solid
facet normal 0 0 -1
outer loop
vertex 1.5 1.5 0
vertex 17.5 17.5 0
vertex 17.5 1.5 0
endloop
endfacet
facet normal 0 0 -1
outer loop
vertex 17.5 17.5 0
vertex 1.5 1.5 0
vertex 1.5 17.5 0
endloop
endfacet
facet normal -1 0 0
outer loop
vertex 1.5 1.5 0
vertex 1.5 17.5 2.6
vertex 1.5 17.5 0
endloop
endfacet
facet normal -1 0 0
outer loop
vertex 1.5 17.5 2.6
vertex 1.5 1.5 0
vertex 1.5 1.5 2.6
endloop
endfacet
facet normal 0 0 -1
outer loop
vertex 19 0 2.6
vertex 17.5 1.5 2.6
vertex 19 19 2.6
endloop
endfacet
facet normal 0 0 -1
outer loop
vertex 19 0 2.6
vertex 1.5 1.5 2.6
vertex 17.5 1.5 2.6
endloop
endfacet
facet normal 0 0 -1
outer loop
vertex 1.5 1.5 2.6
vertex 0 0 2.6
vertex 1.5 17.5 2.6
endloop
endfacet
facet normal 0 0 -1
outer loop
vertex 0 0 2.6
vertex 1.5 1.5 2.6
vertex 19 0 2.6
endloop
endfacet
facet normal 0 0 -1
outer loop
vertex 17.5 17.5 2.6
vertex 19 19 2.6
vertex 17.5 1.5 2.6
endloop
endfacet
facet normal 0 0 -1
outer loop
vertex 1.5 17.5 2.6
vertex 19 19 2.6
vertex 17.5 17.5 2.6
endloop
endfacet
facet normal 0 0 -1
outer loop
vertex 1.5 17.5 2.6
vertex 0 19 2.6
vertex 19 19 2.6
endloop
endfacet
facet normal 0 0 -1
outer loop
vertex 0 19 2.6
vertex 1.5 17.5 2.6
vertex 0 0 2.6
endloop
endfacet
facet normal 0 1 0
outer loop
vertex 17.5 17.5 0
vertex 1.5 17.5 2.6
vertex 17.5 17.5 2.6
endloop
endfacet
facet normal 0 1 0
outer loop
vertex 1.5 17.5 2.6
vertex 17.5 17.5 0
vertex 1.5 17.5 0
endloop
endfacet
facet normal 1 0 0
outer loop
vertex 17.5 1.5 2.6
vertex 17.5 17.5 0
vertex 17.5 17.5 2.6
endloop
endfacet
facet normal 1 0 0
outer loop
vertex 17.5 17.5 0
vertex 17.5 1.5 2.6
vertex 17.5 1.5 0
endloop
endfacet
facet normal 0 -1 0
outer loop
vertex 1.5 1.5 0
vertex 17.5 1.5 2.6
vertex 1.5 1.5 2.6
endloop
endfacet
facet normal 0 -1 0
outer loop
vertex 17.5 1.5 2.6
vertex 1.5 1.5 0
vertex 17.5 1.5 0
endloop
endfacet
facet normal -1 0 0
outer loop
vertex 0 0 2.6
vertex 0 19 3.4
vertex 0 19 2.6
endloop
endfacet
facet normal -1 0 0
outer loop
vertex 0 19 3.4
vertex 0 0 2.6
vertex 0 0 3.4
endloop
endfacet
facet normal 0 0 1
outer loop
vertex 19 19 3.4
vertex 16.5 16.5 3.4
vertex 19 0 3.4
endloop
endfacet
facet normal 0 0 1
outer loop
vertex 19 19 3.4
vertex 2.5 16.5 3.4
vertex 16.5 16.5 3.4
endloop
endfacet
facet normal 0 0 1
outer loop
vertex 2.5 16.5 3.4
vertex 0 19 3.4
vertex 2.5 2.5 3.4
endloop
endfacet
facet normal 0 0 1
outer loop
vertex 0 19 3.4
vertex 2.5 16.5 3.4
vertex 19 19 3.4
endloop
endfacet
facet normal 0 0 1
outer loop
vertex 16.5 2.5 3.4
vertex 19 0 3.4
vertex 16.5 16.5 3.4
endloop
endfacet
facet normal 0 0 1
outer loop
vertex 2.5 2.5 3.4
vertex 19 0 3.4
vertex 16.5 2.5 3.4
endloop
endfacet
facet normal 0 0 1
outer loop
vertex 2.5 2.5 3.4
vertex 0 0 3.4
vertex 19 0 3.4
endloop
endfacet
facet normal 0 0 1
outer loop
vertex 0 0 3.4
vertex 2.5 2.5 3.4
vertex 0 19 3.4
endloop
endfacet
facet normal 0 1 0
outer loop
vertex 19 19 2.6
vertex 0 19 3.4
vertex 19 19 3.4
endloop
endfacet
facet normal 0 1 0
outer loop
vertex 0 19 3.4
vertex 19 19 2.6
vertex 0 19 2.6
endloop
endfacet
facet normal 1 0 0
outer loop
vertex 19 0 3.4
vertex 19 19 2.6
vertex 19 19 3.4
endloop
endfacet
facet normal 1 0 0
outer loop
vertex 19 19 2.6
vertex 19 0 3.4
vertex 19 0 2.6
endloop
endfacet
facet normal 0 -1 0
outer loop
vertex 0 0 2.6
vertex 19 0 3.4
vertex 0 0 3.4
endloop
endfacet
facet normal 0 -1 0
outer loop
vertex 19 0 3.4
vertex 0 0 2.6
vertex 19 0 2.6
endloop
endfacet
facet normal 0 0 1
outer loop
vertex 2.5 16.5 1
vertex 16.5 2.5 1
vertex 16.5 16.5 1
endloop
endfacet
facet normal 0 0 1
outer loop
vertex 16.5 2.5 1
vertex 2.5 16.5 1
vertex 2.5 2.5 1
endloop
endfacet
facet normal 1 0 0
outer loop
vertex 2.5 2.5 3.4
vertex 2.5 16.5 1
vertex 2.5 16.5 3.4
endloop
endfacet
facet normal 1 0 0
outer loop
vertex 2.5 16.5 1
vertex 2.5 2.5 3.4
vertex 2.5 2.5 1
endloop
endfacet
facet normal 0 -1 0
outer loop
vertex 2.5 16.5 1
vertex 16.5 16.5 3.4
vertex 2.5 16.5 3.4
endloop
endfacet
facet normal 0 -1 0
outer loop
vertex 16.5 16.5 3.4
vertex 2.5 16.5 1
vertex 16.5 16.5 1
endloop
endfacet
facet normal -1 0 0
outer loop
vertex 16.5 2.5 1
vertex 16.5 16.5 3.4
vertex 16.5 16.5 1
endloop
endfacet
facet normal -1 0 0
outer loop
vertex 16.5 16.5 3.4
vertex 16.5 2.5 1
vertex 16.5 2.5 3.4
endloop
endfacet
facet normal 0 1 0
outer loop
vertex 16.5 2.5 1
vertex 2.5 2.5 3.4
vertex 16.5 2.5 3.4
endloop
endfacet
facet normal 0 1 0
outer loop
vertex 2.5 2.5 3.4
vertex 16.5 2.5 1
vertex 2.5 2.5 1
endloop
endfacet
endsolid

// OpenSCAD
// Cleaver rev0.8: replaceable badge, millimetres, face down.
// Render "blank" for a translucent insert. For two-colour printing, export
// "mask" and "diffuser" separately and load them together at the SAME origin.
// Edit mark() or import a centred SVG sized to fit inside the 14 mm light bore.
// The 19 mm retaining flange and 16 mm body are the mechanical interface.
part = "blank"; // [blank,mask,diffuser]
face = 16.0;
flange = 19.0;
bore = 14.0;
flange_z = 2.60000;
flange_thickness = 0.8;
diffuser_thickness = 1.0;
mask_thickness = 0.4;

module sq(size) { square([size,size],center=true); }
module mark() { text("C",size=10,halign="center",valign="center",font="Liberation Sans:style=Bold"); }
module blank() {
    difference() {
        union() {
            linear_extrude(flange_z) sq(face);
            translate([0,0,flange_z]) linear_extrude(flange_thickness) sq(flange);
        }
        translate([0,0,diffuser_thickness])
            linear_extrude(flange_z+flange_thickness) sq(bore);
    }
}
module mask() {
    linear_extrude(mask_thickness)
        difference() { sq(face); intersection() { sq(bore-1); mirror([0,1,0]) mark(); } }
}
// The Y mirror keeps lettering readable after turning the face-down print over.
translate([flange/2,flange/2,0]) {
    if (part == "blank") blank();
    else if (part == "mask") mask();
    else if (part == "diffuser") difference() { blank(); mask(); }
}
